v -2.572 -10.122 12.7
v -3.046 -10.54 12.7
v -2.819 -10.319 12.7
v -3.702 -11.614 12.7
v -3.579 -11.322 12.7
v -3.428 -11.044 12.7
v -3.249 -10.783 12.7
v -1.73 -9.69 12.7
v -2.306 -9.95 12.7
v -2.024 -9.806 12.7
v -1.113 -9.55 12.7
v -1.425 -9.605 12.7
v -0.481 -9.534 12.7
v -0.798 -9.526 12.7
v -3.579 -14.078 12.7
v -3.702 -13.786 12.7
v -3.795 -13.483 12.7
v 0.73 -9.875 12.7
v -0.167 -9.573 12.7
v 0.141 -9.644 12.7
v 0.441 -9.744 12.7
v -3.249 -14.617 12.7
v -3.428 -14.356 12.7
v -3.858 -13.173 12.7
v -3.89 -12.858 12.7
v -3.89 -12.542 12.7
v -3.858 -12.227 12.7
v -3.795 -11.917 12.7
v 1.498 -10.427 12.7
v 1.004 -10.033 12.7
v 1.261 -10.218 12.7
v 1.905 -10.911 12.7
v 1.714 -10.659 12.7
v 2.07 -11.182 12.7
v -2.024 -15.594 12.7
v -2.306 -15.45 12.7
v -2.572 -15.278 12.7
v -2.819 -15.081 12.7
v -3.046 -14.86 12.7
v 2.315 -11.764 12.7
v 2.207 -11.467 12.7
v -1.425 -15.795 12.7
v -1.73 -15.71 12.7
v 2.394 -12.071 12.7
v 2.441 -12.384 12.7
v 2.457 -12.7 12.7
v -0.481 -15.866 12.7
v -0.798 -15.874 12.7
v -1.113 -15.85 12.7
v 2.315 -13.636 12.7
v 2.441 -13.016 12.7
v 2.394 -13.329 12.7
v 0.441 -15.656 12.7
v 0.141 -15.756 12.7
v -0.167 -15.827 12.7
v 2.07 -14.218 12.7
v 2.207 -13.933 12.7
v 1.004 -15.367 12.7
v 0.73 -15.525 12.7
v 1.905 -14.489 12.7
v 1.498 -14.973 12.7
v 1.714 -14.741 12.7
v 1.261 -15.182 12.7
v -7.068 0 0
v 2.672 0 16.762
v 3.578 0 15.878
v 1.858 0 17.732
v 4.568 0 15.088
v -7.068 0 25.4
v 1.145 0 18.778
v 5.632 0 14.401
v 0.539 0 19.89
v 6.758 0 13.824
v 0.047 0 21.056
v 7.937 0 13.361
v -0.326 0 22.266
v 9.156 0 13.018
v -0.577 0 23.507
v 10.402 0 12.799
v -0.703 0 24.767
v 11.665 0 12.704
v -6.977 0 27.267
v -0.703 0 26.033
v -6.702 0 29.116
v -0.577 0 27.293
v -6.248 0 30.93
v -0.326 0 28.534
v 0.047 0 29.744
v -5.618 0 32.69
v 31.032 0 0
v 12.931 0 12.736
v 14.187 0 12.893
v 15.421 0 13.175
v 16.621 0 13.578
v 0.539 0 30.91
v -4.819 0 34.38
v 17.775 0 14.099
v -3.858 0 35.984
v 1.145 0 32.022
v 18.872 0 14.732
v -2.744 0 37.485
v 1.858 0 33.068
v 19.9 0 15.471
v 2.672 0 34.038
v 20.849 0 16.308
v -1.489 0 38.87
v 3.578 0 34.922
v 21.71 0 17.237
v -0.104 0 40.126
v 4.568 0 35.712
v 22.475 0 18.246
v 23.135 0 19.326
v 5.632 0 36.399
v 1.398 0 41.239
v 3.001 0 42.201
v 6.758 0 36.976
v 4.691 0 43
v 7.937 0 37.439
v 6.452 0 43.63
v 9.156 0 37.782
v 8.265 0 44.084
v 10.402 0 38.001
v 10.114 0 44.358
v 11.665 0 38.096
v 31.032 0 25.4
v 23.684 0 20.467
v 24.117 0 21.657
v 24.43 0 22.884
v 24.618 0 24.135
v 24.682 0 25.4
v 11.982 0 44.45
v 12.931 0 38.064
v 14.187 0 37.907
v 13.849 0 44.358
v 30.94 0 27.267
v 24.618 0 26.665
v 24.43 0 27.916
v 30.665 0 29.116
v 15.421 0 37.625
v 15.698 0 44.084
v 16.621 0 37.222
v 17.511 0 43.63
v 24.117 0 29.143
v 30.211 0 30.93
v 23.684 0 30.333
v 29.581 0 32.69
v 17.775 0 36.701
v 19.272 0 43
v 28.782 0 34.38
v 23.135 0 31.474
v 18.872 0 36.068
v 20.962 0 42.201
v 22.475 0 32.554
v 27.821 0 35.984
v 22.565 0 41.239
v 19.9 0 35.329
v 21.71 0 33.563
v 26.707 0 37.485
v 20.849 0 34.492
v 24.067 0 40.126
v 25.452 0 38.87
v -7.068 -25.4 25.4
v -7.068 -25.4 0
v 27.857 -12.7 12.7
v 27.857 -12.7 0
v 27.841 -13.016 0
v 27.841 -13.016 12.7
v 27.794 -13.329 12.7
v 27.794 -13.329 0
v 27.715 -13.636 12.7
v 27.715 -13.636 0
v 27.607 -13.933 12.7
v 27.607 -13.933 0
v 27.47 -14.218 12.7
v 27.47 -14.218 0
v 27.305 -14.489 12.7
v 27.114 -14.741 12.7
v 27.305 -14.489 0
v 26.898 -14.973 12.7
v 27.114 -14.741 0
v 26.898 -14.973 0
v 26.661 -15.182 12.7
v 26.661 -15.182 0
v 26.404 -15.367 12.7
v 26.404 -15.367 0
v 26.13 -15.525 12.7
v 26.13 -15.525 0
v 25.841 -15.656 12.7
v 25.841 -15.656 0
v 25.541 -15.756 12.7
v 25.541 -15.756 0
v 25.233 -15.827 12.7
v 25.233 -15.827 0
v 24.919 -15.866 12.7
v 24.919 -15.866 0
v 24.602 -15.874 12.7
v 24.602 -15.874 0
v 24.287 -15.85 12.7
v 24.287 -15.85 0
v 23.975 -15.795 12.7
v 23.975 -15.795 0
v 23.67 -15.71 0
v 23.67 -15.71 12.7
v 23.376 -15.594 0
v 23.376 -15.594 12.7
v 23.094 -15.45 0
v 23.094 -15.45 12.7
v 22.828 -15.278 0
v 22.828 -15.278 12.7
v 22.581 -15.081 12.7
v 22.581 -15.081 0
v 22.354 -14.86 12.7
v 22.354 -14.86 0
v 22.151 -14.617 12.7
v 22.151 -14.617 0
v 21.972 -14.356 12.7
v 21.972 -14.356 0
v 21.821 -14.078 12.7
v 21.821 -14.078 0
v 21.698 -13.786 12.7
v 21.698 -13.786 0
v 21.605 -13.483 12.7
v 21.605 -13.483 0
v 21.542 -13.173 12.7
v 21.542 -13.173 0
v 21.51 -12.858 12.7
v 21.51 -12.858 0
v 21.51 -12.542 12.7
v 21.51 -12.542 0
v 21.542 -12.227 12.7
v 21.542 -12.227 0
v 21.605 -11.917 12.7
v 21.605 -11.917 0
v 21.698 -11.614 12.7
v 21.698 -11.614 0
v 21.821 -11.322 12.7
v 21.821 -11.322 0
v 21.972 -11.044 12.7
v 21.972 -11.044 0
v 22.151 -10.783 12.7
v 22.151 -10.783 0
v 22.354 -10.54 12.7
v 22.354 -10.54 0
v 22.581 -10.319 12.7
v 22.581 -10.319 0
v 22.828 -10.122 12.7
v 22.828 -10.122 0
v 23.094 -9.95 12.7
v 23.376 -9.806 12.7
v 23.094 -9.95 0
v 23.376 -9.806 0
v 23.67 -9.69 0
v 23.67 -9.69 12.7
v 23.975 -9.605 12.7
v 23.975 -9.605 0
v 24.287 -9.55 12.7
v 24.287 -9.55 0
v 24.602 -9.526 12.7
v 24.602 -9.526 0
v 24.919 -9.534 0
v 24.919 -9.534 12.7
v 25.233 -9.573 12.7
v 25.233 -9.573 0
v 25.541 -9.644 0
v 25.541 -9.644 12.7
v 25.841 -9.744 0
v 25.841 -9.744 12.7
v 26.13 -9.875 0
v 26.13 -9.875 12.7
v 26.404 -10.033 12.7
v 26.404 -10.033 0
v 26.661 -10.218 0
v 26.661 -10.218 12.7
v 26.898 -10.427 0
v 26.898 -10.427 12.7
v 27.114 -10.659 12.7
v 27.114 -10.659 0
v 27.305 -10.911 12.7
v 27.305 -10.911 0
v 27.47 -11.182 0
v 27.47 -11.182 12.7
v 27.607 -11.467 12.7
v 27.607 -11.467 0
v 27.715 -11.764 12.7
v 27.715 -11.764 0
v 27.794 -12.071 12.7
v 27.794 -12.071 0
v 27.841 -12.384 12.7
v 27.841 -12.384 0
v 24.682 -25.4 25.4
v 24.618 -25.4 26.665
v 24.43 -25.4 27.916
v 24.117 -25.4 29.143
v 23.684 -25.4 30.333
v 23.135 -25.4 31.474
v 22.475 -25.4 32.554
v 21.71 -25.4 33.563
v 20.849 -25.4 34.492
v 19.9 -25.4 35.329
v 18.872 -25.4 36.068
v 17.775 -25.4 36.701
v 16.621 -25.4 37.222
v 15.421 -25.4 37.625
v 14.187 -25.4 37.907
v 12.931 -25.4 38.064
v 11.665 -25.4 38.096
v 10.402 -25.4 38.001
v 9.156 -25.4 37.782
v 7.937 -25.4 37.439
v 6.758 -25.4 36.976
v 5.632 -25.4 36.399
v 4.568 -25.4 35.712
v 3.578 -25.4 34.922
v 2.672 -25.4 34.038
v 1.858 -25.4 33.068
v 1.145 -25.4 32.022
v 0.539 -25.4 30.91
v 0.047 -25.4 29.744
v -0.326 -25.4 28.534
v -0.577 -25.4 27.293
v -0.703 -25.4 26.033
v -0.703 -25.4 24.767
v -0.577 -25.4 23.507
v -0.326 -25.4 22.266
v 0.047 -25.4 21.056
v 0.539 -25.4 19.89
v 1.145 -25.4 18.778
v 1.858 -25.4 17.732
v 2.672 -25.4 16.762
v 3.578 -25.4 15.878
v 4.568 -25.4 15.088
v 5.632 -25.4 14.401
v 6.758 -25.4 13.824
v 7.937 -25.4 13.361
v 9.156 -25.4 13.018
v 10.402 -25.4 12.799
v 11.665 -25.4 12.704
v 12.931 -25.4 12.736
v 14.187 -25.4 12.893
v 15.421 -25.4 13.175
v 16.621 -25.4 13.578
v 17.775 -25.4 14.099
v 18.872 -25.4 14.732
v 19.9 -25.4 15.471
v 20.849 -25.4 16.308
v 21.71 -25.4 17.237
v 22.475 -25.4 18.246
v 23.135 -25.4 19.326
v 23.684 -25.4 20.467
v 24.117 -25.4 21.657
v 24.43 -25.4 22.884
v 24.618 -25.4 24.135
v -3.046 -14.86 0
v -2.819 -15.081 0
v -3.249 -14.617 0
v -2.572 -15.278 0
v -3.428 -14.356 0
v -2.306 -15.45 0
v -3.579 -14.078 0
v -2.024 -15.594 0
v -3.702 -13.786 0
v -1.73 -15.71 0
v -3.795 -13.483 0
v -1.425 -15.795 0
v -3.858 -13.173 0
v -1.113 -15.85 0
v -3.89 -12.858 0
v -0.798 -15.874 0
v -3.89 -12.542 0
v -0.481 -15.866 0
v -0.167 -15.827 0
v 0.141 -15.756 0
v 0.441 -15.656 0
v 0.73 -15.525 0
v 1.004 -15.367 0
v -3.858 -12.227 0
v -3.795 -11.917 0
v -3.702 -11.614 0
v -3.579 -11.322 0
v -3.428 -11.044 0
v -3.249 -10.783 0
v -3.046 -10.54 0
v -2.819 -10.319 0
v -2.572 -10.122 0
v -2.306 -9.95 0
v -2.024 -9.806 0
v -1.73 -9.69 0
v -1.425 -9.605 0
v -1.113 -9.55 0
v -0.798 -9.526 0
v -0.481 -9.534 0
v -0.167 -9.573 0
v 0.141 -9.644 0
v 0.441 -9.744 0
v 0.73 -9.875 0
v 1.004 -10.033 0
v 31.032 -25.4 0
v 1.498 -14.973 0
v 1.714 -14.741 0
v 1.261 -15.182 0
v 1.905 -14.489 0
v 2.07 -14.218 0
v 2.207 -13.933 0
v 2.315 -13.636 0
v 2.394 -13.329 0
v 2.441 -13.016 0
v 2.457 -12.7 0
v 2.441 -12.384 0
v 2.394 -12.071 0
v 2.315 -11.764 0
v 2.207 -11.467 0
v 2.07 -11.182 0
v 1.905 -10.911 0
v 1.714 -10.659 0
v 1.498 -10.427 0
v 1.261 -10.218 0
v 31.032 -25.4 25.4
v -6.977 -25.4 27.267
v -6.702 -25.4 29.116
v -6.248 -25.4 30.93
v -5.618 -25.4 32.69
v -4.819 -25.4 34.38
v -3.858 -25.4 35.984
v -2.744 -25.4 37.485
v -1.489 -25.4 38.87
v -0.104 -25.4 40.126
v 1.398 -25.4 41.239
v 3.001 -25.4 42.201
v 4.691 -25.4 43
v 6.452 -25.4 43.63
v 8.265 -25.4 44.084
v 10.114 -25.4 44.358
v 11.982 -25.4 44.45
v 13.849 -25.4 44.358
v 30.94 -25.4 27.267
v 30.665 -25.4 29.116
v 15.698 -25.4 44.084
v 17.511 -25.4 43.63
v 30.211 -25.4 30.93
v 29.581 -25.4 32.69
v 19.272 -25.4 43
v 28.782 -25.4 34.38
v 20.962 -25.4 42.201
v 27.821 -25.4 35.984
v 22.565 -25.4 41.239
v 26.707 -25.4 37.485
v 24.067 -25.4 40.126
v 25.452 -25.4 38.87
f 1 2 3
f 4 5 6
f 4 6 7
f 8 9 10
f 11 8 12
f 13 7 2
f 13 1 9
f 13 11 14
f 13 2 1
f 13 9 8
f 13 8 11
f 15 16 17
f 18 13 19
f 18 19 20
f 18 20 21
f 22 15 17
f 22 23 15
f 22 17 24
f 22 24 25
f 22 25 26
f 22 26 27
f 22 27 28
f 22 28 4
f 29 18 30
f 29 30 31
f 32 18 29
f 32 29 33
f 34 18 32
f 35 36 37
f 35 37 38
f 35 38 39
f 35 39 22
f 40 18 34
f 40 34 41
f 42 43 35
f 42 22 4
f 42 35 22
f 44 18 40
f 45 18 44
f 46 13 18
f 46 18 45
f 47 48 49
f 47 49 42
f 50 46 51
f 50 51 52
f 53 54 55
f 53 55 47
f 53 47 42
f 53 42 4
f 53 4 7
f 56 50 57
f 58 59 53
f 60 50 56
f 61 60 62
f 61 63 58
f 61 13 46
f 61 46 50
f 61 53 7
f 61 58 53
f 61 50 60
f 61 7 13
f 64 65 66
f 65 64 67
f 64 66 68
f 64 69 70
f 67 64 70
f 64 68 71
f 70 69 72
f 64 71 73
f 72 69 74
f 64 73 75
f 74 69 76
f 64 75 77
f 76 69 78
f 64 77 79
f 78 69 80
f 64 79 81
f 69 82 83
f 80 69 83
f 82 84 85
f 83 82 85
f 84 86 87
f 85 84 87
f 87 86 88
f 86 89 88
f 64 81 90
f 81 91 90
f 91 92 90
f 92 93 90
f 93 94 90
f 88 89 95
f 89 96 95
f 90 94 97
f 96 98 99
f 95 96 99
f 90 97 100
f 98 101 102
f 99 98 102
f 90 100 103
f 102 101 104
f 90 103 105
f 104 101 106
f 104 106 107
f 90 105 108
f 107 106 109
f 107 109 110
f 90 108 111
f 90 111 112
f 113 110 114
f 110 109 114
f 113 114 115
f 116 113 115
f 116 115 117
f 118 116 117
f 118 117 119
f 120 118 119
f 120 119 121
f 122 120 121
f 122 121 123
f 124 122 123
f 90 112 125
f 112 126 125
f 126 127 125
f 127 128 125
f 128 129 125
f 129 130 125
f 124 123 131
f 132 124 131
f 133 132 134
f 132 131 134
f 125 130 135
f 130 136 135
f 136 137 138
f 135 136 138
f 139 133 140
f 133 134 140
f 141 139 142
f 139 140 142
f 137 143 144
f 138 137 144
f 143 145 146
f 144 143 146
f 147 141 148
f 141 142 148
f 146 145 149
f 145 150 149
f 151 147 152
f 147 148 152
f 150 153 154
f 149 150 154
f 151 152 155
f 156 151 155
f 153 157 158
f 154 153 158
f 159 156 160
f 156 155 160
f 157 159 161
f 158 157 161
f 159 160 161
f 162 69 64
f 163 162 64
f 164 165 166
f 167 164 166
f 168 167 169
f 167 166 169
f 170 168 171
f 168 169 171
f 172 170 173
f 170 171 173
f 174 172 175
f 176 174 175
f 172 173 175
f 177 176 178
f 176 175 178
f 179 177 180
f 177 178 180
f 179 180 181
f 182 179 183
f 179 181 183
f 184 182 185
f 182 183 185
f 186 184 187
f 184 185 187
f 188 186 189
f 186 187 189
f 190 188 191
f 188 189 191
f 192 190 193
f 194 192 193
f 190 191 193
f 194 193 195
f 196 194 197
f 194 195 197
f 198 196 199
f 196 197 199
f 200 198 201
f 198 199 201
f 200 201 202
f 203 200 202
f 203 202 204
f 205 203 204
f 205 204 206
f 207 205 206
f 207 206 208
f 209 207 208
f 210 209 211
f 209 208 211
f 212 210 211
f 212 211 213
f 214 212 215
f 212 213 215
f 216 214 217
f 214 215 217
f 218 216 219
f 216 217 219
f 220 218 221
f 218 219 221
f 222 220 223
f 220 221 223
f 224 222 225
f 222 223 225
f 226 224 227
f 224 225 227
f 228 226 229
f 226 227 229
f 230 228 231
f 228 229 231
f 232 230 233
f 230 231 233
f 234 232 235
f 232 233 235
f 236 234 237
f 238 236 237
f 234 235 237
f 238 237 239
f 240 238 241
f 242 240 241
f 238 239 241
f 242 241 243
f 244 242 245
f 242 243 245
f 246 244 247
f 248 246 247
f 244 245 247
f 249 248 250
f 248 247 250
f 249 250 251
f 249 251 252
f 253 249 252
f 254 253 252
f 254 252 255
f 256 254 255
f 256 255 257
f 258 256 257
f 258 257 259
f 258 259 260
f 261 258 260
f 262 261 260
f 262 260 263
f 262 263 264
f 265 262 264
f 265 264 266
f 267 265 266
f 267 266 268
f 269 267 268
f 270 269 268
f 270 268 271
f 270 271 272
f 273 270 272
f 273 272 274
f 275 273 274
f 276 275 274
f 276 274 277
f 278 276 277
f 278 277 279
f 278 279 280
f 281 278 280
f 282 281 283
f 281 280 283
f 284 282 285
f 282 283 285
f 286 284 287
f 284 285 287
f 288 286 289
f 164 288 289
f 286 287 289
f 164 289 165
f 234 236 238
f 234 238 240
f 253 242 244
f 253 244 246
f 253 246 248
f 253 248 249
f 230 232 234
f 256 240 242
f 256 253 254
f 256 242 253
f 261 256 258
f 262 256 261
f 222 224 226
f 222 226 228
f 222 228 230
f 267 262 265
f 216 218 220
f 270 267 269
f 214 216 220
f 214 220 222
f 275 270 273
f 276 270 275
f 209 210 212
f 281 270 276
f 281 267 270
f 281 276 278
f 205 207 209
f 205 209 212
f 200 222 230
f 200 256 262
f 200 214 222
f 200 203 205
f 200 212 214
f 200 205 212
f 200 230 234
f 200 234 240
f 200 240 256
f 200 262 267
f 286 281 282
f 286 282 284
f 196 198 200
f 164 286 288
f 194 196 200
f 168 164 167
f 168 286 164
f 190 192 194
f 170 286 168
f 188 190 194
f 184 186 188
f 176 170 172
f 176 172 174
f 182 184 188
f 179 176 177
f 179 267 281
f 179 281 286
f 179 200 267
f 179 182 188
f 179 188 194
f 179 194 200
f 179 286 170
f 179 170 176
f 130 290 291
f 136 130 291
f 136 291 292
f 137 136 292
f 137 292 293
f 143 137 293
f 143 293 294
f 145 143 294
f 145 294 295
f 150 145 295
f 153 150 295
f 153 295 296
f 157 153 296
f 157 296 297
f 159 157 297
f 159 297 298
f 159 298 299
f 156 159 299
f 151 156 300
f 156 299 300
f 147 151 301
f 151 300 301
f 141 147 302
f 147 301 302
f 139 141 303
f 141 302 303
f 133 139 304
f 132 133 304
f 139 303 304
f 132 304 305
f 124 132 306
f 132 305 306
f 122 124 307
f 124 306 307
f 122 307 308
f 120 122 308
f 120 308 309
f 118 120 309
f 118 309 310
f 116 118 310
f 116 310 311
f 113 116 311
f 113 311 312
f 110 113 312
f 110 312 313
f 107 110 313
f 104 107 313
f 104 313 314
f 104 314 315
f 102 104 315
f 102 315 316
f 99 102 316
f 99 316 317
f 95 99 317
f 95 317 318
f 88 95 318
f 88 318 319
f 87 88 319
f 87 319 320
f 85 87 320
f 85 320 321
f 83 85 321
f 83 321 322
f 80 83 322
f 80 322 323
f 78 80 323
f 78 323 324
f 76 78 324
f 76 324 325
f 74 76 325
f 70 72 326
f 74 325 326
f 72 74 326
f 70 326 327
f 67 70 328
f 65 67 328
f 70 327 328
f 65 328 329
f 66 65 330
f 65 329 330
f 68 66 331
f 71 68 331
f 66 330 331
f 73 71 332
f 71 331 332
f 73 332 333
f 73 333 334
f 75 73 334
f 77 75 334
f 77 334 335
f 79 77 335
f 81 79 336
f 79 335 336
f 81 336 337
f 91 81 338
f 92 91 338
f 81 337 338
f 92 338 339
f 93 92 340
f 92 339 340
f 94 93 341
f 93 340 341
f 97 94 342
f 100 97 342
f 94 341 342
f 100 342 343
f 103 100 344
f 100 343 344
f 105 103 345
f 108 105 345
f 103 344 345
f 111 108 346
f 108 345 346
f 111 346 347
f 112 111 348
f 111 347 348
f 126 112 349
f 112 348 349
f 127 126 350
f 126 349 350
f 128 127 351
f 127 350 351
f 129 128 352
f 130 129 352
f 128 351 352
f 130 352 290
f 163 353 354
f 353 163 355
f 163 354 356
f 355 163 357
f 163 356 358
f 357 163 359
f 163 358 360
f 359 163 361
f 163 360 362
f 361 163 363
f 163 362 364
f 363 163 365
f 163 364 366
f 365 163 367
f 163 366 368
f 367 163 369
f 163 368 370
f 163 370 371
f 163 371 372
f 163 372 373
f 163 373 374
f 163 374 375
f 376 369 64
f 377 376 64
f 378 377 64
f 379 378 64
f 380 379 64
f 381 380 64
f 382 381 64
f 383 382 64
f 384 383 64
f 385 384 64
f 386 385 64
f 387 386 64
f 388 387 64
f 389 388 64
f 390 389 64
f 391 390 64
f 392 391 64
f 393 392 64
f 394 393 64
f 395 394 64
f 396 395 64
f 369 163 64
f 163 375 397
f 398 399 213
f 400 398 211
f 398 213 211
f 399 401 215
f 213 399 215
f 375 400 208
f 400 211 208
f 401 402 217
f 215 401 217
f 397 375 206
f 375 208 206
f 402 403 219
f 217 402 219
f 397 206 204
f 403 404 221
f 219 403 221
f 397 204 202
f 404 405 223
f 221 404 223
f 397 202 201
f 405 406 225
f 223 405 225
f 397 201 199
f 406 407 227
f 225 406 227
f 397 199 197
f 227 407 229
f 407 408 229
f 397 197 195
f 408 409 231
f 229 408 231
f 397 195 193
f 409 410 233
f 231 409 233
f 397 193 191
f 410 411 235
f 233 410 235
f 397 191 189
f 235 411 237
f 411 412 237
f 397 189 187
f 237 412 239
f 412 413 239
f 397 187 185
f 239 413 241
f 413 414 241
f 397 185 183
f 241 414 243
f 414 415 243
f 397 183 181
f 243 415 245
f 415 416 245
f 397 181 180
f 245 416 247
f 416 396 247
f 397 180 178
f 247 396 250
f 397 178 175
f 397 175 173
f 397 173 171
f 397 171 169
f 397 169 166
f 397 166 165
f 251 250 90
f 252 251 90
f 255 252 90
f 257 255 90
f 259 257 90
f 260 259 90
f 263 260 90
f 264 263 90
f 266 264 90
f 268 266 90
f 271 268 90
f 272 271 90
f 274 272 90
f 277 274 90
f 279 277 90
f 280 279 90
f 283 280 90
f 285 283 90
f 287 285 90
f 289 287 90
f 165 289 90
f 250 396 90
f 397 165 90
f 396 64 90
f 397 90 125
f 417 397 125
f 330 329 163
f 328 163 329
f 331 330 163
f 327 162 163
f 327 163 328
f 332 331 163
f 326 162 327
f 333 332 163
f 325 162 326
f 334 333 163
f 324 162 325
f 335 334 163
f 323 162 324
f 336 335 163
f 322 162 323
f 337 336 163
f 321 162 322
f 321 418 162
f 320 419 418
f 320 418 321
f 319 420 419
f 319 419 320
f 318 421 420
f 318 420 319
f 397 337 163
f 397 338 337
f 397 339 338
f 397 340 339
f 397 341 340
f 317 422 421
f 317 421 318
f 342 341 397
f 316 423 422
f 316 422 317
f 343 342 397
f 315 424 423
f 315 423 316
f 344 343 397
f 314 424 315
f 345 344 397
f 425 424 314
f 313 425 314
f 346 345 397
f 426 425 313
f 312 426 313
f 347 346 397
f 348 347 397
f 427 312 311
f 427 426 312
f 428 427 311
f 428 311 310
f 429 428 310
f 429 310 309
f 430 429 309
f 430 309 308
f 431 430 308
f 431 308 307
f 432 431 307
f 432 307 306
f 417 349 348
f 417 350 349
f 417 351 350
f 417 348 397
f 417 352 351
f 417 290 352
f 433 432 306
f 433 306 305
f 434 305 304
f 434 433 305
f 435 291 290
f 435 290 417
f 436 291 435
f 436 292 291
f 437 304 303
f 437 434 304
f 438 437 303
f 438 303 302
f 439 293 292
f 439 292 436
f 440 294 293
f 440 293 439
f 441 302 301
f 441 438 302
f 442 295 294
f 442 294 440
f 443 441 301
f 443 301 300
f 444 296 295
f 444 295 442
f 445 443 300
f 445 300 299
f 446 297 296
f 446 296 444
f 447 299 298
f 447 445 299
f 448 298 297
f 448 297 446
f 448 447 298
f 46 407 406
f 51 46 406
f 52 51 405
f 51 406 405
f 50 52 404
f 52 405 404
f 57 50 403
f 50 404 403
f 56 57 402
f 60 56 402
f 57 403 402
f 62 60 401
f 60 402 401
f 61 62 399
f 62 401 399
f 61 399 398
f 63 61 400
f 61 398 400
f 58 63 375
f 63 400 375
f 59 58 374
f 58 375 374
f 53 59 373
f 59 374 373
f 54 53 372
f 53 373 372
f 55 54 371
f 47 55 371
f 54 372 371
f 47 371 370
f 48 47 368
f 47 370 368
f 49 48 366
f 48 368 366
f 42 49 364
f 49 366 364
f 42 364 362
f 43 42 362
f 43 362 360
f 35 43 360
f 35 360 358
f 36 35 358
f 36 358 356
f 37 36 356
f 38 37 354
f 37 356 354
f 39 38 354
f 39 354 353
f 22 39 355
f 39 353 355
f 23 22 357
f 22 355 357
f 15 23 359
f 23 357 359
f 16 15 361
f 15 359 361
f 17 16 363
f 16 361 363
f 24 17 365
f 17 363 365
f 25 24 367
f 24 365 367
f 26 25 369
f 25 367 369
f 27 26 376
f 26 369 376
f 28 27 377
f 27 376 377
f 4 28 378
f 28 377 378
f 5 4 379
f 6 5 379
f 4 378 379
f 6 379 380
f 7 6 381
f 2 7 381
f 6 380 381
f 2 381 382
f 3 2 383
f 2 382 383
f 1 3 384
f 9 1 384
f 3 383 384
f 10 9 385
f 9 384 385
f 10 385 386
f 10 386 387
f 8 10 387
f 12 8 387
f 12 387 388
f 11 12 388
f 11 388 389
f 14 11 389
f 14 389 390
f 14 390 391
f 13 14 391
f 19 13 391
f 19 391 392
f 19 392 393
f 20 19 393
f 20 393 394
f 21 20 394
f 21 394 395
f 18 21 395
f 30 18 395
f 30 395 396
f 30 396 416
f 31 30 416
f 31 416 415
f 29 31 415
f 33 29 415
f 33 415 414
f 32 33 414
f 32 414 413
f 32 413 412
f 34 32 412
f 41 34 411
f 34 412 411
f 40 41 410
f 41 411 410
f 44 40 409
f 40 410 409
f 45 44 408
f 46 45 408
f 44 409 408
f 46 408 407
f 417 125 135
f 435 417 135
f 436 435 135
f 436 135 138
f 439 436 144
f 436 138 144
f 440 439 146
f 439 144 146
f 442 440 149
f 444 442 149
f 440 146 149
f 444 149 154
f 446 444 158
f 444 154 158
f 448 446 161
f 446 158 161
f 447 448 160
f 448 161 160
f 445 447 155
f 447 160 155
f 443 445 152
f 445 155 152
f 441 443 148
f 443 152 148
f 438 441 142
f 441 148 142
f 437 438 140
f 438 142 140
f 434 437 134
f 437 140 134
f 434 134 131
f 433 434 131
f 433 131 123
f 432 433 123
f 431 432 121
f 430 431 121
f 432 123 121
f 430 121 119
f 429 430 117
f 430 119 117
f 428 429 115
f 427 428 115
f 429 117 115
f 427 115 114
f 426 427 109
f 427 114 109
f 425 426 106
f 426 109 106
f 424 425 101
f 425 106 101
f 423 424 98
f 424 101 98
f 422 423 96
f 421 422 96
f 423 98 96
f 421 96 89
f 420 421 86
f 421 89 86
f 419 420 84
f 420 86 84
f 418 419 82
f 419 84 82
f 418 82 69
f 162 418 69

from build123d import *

# Parameters (mm, degrees)
F1_DEPTH = 25.4
F2_R     = 12.7
F3_DEPTH = 61.57864
F4_R     = 3.175
F5_DEPTH = 12.7


with BuildPart() as f1:
    # F0 (on Front) → F1 (new body)
    with BuildSketch(Plane.XZ):
        with BuildLine():
            Line((-7.068471, 25.4), (-7.068471, 0))
            Line((-7.068471, 0), (31.031529, 0))
            Line((31.031529, 0), (31.031529, 25.4))
            ThreePointArc((31.031529, 25.4), (25.451913, 38.870384), (11.981529, 44.45))
            ThreePointArc((11.981529, 44.45), (-1.488855, 38.870384), (-7.068471, 25.4))
        make_face()
    extrude(amount=F1_DEPTH)

    # F2 (on face) → F3 (cut)
    with BuildSketch(Plane.XZ.offset(25.4)):
        with Locations((11.981529, 25.4)):
            Circle(F2_R)
    extrude(amount=-F3_DEPTH, mode=Mode.SUBTRACT)

    # F4 (on face) → F5 (cut)
    with BuildSketch(Plane(origin=(0, 0, 0), x_dir=(1, 0, 0), z_dir=(0, 0, -1))):
        with Locations((-0.718471, 12.7)):
            Circle(F4_R)
        with Locations((24.681529, 12.7)):
            Circle(F4_R)
    extrude(amount=-F5_DEPTH, mode=Mode.SUBTRACT)


solid = f1.part
